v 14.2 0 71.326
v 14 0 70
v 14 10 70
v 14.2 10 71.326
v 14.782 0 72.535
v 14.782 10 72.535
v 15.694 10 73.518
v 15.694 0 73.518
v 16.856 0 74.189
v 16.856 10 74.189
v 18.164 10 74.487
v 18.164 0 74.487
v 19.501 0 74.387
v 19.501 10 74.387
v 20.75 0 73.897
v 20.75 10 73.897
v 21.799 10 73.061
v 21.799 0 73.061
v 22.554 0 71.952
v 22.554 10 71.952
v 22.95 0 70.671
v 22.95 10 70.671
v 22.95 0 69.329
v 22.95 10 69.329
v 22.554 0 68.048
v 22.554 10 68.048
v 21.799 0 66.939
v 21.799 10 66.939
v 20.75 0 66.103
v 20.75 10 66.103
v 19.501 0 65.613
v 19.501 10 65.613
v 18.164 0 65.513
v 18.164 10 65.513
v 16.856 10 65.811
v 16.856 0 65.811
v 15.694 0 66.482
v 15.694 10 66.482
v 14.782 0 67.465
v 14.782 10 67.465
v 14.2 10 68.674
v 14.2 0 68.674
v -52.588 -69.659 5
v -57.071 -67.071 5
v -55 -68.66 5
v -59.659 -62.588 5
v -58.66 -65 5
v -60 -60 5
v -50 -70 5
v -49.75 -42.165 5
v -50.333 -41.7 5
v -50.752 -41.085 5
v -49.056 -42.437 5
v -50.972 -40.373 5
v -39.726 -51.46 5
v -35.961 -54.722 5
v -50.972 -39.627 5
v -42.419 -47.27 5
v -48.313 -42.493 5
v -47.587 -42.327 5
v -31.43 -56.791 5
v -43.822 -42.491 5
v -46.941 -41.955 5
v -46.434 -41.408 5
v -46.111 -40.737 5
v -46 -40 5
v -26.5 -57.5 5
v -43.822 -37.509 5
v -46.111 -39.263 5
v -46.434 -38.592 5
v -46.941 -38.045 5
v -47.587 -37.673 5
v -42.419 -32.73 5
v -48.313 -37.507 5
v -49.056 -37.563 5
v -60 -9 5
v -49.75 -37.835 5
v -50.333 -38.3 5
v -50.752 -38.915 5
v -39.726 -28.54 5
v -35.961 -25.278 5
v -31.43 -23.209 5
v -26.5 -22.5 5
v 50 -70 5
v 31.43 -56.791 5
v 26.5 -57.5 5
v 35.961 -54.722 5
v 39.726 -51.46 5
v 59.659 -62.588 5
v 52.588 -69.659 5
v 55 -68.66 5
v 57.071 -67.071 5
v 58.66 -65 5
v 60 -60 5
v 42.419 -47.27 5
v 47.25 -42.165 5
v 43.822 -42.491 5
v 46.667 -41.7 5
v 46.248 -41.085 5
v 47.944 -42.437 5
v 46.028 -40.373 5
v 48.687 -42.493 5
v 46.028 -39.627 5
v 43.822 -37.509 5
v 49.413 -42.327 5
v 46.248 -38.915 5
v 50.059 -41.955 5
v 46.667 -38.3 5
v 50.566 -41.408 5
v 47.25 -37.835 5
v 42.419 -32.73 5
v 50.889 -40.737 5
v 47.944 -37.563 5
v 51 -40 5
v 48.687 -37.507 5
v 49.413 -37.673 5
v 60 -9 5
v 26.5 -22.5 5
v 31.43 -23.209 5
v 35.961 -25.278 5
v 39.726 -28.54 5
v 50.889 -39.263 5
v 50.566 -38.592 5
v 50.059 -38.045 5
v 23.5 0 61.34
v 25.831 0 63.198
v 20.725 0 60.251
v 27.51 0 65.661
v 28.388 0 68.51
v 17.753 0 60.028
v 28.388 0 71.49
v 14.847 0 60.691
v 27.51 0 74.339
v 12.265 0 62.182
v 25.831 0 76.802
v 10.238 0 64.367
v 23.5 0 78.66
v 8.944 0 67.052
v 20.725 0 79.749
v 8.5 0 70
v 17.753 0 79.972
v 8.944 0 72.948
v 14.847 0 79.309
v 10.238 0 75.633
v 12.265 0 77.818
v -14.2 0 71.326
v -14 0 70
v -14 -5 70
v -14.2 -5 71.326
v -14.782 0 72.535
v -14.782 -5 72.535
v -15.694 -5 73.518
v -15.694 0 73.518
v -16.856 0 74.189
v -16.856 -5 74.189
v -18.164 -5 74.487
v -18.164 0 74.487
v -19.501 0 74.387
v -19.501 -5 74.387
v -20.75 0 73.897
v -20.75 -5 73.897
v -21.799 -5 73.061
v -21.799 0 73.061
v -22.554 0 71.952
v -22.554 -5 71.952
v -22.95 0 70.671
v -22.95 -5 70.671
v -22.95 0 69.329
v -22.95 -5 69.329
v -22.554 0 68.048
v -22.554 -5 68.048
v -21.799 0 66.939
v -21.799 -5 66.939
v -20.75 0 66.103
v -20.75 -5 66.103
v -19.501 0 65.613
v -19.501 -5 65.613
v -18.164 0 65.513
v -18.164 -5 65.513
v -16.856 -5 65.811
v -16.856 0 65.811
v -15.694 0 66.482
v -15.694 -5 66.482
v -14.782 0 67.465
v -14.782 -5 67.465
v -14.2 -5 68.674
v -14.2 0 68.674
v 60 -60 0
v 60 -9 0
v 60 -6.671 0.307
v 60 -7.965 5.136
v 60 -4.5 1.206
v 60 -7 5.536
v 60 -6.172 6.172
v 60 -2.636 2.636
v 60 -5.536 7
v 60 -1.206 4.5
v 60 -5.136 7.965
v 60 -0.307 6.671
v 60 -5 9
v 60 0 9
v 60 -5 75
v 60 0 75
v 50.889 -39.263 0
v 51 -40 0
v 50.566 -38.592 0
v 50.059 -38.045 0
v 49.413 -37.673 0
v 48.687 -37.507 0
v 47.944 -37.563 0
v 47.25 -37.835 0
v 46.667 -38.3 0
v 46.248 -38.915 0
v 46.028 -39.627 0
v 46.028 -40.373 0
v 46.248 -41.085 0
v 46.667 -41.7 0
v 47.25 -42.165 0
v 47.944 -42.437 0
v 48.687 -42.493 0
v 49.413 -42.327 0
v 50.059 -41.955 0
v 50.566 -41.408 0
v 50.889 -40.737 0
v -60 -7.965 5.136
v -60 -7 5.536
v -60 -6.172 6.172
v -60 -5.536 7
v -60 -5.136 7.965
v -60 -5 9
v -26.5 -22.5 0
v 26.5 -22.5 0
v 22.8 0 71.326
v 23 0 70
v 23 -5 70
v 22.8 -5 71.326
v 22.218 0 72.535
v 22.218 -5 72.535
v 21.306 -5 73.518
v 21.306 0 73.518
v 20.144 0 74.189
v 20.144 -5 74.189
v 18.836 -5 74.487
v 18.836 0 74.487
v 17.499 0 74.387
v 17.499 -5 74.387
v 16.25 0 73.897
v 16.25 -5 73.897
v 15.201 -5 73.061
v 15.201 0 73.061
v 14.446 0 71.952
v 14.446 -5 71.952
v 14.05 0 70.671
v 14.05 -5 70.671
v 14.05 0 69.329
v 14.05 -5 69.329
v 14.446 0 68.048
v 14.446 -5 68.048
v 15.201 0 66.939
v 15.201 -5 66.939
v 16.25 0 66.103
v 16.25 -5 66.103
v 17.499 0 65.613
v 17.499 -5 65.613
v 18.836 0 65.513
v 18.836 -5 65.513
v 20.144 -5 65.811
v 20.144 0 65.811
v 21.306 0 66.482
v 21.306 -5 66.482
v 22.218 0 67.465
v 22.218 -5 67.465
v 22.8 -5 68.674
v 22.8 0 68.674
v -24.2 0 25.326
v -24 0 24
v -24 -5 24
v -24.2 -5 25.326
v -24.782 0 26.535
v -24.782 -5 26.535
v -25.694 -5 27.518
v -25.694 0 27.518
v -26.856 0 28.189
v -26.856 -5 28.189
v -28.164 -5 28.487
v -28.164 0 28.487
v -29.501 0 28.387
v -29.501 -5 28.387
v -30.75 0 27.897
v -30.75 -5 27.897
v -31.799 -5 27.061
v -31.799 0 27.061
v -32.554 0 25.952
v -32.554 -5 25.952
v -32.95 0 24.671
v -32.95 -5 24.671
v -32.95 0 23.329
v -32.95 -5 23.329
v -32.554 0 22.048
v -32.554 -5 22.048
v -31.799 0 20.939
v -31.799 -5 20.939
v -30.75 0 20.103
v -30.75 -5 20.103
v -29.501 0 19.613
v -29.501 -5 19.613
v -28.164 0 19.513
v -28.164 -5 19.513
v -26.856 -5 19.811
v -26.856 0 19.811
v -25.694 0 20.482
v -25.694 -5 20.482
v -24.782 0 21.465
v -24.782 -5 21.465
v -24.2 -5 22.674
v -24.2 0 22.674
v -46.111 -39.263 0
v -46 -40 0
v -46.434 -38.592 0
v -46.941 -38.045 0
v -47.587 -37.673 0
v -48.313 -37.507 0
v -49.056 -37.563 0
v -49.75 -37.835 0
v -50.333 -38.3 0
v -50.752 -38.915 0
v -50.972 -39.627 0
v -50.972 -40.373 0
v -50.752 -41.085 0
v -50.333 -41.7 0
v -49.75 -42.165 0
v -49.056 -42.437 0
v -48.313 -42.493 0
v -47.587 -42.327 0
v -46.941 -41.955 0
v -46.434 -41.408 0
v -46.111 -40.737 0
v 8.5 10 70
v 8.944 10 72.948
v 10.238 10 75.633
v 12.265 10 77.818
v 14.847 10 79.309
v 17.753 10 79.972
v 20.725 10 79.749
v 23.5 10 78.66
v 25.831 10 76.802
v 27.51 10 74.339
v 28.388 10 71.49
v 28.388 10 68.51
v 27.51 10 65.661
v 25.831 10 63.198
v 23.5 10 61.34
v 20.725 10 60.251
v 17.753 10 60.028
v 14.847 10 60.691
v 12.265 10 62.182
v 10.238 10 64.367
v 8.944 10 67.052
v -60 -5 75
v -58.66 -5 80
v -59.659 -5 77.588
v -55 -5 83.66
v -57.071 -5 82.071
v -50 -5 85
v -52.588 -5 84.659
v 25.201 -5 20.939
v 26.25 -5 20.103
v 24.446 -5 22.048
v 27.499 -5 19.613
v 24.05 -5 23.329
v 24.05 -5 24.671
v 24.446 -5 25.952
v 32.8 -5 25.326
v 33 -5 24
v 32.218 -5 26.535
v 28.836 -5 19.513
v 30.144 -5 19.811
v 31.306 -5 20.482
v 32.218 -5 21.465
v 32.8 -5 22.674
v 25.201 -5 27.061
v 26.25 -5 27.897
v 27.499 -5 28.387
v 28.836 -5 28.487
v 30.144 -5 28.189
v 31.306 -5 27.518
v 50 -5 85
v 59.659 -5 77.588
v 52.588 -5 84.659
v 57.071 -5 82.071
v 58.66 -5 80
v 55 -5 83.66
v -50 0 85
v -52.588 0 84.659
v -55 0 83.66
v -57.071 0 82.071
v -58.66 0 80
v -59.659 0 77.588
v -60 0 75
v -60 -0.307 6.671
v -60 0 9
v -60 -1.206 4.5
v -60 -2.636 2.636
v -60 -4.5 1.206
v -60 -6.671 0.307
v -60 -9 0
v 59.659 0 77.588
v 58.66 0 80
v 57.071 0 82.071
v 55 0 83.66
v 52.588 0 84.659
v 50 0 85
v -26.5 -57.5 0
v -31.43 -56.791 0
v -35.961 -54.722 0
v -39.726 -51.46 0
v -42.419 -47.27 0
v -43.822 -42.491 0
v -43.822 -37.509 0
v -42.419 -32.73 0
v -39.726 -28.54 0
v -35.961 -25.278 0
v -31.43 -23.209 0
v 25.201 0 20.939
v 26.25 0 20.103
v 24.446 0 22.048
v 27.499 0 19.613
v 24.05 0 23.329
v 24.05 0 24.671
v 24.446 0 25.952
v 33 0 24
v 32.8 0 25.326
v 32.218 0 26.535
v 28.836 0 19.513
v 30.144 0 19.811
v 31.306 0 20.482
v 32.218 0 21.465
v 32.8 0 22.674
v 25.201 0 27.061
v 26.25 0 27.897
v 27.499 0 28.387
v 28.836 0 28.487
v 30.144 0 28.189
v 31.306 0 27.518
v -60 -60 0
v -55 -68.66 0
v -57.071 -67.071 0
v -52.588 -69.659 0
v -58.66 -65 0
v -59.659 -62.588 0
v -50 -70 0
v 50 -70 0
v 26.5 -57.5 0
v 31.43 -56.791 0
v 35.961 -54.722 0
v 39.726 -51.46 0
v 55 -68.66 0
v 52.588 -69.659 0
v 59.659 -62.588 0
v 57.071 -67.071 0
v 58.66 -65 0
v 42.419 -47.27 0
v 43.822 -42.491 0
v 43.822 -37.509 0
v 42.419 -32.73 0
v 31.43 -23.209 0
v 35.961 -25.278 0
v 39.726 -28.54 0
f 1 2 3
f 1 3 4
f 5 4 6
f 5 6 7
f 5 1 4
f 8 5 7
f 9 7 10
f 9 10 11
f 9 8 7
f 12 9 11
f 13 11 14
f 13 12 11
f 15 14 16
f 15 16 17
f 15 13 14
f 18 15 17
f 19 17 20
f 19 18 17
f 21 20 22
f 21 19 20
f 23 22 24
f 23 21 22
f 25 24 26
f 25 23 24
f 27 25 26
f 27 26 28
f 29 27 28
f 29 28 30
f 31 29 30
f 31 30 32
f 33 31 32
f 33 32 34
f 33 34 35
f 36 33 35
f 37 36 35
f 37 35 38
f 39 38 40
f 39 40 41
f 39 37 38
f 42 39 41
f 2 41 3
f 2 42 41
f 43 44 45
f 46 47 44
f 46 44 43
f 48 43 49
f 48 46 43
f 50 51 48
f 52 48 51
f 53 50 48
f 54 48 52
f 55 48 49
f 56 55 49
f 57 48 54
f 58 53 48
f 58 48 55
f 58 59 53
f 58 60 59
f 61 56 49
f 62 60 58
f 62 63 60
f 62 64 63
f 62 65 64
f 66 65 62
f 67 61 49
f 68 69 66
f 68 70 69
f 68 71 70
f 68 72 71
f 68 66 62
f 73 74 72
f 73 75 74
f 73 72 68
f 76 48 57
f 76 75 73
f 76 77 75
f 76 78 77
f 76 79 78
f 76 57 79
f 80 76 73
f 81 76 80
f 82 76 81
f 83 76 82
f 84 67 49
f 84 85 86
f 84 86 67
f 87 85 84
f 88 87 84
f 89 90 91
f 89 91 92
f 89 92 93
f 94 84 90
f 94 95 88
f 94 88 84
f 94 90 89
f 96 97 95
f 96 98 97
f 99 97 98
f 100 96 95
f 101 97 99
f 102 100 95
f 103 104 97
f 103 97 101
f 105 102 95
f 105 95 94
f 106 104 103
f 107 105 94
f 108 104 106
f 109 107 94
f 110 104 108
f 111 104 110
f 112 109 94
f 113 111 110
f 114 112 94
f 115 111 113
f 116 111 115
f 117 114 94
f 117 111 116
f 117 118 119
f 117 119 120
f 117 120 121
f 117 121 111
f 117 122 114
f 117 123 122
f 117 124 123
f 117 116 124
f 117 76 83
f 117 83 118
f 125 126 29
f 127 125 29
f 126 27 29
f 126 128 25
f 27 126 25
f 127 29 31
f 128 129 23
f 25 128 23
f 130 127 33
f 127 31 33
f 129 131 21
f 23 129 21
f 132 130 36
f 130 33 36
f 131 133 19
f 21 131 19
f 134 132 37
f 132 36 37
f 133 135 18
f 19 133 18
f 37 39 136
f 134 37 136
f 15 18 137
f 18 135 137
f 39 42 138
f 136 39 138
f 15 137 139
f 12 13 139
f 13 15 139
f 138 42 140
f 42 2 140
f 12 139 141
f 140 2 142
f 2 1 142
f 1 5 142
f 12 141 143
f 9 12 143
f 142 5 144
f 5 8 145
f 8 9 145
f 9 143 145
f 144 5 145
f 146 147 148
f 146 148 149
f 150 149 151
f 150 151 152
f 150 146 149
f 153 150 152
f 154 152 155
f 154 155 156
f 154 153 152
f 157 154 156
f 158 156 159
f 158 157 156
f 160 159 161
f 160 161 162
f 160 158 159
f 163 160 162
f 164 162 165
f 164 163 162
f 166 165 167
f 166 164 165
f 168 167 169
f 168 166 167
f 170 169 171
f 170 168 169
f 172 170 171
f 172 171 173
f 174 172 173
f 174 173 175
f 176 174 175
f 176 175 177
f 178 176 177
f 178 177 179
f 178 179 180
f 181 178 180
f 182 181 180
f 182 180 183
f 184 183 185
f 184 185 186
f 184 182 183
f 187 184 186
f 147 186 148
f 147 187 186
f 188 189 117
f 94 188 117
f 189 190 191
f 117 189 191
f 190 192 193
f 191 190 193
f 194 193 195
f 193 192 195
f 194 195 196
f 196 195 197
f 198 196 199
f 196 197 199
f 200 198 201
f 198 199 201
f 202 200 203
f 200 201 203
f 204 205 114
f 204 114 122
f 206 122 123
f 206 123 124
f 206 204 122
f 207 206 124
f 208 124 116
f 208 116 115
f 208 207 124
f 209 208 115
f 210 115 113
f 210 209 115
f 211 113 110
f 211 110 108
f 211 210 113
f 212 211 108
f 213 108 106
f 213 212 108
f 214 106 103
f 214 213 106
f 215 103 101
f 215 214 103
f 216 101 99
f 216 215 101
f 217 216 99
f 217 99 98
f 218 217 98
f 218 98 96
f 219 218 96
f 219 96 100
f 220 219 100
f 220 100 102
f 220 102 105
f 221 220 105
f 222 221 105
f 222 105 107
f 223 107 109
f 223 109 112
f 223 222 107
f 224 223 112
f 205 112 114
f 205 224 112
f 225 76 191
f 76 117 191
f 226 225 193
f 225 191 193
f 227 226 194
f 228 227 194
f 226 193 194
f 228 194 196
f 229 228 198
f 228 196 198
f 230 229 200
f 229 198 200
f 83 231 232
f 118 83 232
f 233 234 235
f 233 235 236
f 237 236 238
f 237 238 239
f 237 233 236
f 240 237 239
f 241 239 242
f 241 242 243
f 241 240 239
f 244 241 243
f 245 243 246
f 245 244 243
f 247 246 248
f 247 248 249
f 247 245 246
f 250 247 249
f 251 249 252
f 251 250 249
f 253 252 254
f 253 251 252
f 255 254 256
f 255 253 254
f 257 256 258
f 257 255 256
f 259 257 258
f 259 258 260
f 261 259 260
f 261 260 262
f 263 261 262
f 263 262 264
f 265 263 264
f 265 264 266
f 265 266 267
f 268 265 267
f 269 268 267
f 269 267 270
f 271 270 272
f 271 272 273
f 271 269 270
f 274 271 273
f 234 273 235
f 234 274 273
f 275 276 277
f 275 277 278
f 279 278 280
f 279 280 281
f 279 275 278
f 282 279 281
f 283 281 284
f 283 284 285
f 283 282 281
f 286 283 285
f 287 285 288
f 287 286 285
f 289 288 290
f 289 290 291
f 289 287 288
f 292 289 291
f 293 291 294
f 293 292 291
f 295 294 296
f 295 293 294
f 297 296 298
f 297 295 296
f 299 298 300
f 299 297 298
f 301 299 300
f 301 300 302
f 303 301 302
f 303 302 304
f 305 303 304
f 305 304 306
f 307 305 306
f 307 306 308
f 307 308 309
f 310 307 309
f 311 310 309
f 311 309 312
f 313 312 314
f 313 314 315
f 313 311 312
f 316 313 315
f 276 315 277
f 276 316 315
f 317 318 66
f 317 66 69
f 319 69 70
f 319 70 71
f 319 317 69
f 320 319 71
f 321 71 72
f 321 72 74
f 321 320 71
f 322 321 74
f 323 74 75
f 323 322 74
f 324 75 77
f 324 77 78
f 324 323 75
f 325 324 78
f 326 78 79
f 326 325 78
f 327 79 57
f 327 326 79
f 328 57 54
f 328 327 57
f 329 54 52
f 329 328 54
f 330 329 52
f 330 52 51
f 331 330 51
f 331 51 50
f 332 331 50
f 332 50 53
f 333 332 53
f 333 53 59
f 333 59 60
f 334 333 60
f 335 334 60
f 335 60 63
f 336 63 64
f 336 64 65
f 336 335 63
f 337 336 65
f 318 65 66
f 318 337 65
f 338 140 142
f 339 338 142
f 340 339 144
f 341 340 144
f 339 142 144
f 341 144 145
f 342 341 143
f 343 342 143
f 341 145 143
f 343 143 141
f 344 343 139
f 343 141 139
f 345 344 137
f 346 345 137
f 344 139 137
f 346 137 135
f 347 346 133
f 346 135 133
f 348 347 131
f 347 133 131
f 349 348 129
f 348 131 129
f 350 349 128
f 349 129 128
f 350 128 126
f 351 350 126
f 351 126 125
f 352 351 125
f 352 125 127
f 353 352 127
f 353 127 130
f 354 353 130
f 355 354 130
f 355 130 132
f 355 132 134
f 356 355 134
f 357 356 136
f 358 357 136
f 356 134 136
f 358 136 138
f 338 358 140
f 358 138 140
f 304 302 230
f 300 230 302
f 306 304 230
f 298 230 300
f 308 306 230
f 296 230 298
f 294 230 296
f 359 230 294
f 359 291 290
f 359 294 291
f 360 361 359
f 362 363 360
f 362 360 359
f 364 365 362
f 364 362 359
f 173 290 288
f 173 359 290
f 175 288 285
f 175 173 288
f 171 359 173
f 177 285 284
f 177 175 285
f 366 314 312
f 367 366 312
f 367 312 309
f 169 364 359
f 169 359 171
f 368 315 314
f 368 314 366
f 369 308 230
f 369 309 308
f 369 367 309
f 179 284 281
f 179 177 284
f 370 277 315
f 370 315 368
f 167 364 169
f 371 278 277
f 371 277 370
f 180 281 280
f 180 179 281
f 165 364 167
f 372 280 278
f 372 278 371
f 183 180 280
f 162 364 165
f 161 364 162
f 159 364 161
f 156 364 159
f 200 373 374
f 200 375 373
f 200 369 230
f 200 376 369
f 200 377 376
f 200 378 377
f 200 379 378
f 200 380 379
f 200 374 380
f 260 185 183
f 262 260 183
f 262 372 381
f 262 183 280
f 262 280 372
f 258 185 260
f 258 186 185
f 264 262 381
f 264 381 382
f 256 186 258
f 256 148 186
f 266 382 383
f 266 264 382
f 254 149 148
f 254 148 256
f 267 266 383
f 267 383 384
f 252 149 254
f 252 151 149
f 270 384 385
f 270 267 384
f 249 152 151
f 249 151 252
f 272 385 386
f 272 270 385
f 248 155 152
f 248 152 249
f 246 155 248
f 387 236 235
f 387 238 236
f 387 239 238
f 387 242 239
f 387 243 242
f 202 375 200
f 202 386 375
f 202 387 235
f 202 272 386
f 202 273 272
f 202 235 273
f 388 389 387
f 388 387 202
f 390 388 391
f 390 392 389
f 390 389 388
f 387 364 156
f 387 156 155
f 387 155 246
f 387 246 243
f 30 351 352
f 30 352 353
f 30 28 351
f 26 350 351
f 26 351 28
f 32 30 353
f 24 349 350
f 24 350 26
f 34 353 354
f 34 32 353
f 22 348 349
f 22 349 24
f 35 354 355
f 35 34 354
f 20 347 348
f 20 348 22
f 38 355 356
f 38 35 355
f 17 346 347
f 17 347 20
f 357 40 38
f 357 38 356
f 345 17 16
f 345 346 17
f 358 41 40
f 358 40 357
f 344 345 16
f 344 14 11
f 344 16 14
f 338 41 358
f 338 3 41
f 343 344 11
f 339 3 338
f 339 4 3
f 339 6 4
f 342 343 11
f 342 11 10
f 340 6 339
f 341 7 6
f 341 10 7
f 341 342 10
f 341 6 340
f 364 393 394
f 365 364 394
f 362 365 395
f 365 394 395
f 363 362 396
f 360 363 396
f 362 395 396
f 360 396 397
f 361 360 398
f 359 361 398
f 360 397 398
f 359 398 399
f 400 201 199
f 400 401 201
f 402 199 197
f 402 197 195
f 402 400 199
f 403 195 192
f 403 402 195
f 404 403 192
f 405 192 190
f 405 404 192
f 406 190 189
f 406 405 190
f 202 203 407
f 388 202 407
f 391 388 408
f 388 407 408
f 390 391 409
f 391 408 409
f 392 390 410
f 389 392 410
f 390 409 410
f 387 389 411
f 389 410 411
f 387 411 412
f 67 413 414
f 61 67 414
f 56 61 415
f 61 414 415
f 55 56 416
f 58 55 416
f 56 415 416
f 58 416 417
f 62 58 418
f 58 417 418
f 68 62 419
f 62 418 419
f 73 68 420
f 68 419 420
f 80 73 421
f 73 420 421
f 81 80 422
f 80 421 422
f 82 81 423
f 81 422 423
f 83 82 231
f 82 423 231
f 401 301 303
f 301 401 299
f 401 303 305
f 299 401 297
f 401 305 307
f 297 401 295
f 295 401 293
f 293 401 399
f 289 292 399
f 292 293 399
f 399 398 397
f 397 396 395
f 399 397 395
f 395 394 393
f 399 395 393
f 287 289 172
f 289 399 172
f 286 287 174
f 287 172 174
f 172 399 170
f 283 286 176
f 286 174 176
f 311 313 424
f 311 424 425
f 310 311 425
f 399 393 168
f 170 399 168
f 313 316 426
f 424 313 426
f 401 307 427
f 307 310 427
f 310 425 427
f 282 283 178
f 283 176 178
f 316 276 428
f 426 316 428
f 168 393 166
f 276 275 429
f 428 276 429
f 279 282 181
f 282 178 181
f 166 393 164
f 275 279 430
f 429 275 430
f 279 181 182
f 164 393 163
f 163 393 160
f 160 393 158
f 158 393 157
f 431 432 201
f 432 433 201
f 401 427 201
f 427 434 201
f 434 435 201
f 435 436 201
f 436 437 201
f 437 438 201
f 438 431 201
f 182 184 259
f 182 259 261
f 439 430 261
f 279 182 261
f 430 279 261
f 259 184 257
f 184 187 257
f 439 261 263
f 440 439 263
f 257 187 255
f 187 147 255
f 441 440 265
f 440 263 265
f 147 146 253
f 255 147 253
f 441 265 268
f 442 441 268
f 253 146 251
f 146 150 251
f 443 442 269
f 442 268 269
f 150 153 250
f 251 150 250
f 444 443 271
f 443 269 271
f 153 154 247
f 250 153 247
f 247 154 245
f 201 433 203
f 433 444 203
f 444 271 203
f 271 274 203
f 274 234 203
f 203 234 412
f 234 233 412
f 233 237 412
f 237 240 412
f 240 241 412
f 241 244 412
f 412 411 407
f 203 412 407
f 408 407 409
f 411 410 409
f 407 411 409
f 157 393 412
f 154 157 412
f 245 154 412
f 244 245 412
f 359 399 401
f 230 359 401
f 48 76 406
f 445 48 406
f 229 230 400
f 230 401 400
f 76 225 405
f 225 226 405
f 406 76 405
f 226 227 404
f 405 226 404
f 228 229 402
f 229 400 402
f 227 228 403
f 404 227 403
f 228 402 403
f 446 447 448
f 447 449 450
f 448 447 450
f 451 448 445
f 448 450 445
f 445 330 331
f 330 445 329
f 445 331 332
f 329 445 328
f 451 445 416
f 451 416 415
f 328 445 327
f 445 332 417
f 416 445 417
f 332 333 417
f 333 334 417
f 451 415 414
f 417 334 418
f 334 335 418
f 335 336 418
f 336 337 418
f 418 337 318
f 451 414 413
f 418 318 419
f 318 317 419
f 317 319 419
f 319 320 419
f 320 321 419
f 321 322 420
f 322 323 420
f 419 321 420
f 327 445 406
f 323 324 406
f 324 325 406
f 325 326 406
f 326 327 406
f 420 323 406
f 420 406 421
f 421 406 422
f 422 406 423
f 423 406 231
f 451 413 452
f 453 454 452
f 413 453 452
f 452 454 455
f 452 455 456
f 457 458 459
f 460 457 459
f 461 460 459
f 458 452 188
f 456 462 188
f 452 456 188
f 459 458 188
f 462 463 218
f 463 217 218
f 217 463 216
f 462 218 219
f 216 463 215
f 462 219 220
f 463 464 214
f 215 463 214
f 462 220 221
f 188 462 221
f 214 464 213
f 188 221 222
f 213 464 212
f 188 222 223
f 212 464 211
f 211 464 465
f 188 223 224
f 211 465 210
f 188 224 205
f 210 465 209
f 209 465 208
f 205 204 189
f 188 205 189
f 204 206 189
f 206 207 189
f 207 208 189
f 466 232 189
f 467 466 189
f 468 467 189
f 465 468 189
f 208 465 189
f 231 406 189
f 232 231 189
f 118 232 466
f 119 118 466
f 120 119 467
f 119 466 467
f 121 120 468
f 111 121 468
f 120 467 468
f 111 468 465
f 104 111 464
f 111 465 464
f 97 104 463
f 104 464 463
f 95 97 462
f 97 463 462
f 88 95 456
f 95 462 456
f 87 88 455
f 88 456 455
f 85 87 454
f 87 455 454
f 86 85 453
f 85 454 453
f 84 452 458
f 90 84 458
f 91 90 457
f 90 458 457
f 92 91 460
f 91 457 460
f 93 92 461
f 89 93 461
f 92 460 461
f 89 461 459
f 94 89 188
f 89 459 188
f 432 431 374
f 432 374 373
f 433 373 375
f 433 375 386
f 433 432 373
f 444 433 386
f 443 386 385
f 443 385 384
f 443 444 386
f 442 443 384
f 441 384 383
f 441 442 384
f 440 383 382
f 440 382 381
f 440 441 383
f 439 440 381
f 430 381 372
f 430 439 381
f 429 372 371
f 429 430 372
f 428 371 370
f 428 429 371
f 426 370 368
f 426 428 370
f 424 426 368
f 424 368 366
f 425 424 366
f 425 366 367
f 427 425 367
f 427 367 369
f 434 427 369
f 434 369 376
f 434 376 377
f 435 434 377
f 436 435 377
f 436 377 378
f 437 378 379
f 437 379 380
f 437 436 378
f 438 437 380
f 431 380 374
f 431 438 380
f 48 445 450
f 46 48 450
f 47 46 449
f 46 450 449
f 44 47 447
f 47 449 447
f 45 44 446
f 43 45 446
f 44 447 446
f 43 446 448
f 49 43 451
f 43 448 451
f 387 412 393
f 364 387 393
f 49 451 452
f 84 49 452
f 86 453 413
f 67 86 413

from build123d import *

# Parameters (mm, degrees)
F0_R     = 2.5
F1_DEPTH = 5
F0_R_2   = 4.5
F2_DEPTH = 5
F3_ANGLE = 90
F6_R     = 4
F7_R     = 9
F8_R     = 10
F8_R_2   = 4.5
F9_DEPTH = 10


with BuildPart() as f1:
    # F0 (on Top) → F1 (new body)
    with BuildSketch(Plane.XY):
        with BuildLine():
            Line((60, 0), (-60, 0))
            Line((-60, 0), (-60, -60))
            ThreePointArc((-60, -60), (-57.0710678119, -67.0710678119), (-50, -70))
            Line((-50, -70), (50, -70))
            ThreePointArc((50, -70), (57.0710678119, -67.0710678119), (60, -60))
            Line((60, -60), (60, 0))
        make_face()
        with Locations((-48.5, -40)):
            Circle(F0_R, mode=Mode.SUBTRACT)
        with BuildLine():
            Line((-26.5, -22.5), (26.5, -22.5))
            ThreePointArc((26.5, -22.5), (44, -40), (26.5, -57.5))
            Line((26.5, -57.5), (-26.5, -57.5))
            ThreePointArc((-26.5, -57.5), (-44, -40), (-26.5, -22.5))
        make_face(mode=Mode.SUBTRACT)
        with Locations((48.5, -40)):
            Circle(F0_R, mode=Mode.SUBTRACT)
    extrude(amount=F1_DEPTH)


with BuildPart() as f2:
    # F0 (on Top) → F2 (new body)
    with BuildSketch(Plane.XY):
        with BuildLine():
            Line((-60, 75), (-60, 0))
            Line((-60, 0), (60, 0))
            Line((60, 0), (60, 75))
            ThreePointArc((60, 75), (57.0710678119, 82.0710678119), (50, 85))
            Line((50, 85), (-50, 85))
            ThreePointArc((-50, 85), (-57.0710678119, 82.0710678119), (-60, 75))
        make_face()
        with Locations((-28.5, 24)):
            Circle(F0_R_2, mode=Mode.SUBTRACT)
        with Locations((-18.5, 70)):
            Circle(F0_R_2, mode=Mode.SUBTRACT)
        with Locations((28.5, 24)):
            Circle(F0_R_2, mode=Mode.SUBTRACT)
        with Locations((18.5, 70)):
            Circle(F0_R_2, mode=Mode.SUBTRACT)
    extrude(amount=F2_DEPTH)


with BuildPart() as f2_1:
    # F3: moved
    add(f2.part.rotate(Axis((0, 0, 5), (1, 0, 0)), F3_ANGLE))


with BuildPart() as f2_2:
    # F4: moved
    add(f2_1.part.moved(Location((0, -5, -5))))


with BuildPart() as f1_1:
    add(f1.part)

    # F5: union F2
    add(f2_2.part)

    # F6
    f6_edges = [f1_1.edges().sort_by_distance(p)[0] for p in [
        (0, -5, 5),
    ]]
    fillet(f6_edges, radius=F6_R)

    # F7
    f7_edges = [f1_1.edges().sort_by_distance(p)[0] for p in [
        (0, 0, 0),
    ]]
    fillet(f7_edges, radius=F7_R)


with BuildPart() as f9:
    # F8 (on face) → F9 (new body)
    with BuildSketch(Plane(origin=(0, 0, 0), x_dir=(-1, 0, 0), z_dir=(0, 1, 0))):
        with Locations((-18.5, 70)):
            Circle(F8_R)
        with Locations((-18.5, 70)):
            Circle(F8_R_2, mode=Mode.SUBTRACT)
    extrude(amount=F9_DEPTH)


solid = Compound([f1_1.part, f9.part])
